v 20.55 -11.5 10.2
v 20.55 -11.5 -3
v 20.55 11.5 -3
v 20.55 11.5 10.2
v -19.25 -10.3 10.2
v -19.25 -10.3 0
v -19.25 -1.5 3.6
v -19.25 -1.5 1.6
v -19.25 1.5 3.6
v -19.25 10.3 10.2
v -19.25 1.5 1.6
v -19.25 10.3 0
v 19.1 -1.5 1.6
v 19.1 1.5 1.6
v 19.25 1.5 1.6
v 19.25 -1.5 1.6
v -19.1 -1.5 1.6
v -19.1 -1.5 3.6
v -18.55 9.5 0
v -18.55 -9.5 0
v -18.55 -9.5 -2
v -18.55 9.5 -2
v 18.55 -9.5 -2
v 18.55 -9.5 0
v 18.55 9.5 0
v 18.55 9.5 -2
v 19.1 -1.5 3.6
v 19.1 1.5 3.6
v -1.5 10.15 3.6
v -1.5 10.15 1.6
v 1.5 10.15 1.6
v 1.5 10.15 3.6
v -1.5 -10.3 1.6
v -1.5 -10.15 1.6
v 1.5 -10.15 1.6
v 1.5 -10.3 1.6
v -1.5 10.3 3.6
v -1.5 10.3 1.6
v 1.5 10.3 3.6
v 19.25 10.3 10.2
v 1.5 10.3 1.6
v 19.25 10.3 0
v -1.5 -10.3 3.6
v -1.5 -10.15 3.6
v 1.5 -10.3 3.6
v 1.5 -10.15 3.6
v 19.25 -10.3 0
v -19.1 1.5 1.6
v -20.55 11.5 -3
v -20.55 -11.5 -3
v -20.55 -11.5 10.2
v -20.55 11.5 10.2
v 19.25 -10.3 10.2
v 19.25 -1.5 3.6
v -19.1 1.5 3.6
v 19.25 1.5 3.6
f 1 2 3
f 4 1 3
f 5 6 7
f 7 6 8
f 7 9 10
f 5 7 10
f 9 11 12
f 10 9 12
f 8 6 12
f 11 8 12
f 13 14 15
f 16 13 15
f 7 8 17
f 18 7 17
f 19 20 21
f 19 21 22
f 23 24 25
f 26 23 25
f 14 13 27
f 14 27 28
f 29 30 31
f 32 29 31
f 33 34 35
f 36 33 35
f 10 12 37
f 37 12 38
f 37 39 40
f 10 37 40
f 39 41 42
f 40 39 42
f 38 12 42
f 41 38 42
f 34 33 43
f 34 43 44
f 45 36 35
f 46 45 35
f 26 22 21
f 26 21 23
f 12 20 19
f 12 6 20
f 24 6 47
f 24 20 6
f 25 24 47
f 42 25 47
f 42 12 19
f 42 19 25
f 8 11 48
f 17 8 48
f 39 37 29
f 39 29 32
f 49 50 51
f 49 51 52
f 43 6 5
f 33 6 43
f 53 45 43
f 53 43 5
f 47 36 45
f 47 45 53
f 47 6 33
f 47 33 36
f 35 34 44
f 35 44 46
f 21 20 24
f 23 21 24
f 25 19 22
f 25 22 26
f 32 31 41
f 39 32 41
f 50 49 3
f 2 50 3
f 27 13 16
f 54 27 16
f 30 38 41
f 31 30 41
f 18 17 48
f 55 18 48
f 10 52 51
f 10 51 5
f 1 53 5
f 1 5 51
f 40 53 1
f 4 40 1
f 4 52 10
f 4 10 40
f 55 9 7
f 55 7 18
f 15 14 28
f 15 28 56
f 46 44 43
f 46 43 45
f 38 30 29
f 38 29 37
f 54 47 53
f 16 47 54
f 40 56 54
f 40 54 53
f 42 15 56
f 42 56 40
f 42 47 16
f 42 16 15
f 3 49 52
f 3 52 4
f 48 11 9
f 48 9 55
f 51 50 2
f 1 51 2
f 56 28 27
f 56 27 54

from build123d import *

# Parameters (mm, degrees)
SKETCH001_W     = 41.1
SKETCH001_H     = 23
PAD_DEPTH       = 13.2
SKETCH002_W     = 38.5
SKETCH002_H     = 20.6
POCKET_DEPTH    = 10.201
SKETCH_W        = 37.1
SKETCH_H        = 19
POCKET001_DEPTH = 2
SKETCH007_W     = 0.15
SKETCH007_H     = 3
SKETCH007_W_2   = 3
SKETCH007_H_2   = 0.15
PAD003_DEPTH    = 2


with BuildPart() as part:
    # Sketch001 (on DatumPlane) → Pad (new body)
    with BuildSketch(Plane.XY.offset(-3)):
        Rectangle(SKETCH001_W, SKETCH001_H)
    extrude(amount=PAD_DEPTH)

    # Sketch002 → Pocket (cut, through all)
    with BuildSketch(Plane.XY):
        Rectangle(SKETCH002_W, SKETCH002_H)
    extrude(amount=POCKET_DEPTH, mode=Mode.SUBTRACT)

    # Sketch → Pocket001 (cut)
    with BuildSketch(Plane.XY):
        Rectangle(SKETCH_W, SKETCH_H)
    extrude(amount=-POCKET001_DEPTH, mode=Mode.SUBTRACT)

    # Sketch007 (on DatumPlane) → Pad003 (join)
    with BuildSketch(Plane.XY.offset(1.6)):
        with Locations((-19.175, 0)):
            Rectangle(SKETCH007_W, SKETCH007_H)
        with Locations((0, 10.225)):
            Rectangle(SKETCH007_W_2, SKETCH007_H_2)
        with Locations((0, -10.225)):
            Rectangle(SKETCH007_W_2, SKETCH007_H_2)
        with Locations((19.175, 0)):
            Rectangle(SKETCH007_W, SKETCH007_H)
    extrude(amount=PAD003_DEPTH)


solid = part.part
